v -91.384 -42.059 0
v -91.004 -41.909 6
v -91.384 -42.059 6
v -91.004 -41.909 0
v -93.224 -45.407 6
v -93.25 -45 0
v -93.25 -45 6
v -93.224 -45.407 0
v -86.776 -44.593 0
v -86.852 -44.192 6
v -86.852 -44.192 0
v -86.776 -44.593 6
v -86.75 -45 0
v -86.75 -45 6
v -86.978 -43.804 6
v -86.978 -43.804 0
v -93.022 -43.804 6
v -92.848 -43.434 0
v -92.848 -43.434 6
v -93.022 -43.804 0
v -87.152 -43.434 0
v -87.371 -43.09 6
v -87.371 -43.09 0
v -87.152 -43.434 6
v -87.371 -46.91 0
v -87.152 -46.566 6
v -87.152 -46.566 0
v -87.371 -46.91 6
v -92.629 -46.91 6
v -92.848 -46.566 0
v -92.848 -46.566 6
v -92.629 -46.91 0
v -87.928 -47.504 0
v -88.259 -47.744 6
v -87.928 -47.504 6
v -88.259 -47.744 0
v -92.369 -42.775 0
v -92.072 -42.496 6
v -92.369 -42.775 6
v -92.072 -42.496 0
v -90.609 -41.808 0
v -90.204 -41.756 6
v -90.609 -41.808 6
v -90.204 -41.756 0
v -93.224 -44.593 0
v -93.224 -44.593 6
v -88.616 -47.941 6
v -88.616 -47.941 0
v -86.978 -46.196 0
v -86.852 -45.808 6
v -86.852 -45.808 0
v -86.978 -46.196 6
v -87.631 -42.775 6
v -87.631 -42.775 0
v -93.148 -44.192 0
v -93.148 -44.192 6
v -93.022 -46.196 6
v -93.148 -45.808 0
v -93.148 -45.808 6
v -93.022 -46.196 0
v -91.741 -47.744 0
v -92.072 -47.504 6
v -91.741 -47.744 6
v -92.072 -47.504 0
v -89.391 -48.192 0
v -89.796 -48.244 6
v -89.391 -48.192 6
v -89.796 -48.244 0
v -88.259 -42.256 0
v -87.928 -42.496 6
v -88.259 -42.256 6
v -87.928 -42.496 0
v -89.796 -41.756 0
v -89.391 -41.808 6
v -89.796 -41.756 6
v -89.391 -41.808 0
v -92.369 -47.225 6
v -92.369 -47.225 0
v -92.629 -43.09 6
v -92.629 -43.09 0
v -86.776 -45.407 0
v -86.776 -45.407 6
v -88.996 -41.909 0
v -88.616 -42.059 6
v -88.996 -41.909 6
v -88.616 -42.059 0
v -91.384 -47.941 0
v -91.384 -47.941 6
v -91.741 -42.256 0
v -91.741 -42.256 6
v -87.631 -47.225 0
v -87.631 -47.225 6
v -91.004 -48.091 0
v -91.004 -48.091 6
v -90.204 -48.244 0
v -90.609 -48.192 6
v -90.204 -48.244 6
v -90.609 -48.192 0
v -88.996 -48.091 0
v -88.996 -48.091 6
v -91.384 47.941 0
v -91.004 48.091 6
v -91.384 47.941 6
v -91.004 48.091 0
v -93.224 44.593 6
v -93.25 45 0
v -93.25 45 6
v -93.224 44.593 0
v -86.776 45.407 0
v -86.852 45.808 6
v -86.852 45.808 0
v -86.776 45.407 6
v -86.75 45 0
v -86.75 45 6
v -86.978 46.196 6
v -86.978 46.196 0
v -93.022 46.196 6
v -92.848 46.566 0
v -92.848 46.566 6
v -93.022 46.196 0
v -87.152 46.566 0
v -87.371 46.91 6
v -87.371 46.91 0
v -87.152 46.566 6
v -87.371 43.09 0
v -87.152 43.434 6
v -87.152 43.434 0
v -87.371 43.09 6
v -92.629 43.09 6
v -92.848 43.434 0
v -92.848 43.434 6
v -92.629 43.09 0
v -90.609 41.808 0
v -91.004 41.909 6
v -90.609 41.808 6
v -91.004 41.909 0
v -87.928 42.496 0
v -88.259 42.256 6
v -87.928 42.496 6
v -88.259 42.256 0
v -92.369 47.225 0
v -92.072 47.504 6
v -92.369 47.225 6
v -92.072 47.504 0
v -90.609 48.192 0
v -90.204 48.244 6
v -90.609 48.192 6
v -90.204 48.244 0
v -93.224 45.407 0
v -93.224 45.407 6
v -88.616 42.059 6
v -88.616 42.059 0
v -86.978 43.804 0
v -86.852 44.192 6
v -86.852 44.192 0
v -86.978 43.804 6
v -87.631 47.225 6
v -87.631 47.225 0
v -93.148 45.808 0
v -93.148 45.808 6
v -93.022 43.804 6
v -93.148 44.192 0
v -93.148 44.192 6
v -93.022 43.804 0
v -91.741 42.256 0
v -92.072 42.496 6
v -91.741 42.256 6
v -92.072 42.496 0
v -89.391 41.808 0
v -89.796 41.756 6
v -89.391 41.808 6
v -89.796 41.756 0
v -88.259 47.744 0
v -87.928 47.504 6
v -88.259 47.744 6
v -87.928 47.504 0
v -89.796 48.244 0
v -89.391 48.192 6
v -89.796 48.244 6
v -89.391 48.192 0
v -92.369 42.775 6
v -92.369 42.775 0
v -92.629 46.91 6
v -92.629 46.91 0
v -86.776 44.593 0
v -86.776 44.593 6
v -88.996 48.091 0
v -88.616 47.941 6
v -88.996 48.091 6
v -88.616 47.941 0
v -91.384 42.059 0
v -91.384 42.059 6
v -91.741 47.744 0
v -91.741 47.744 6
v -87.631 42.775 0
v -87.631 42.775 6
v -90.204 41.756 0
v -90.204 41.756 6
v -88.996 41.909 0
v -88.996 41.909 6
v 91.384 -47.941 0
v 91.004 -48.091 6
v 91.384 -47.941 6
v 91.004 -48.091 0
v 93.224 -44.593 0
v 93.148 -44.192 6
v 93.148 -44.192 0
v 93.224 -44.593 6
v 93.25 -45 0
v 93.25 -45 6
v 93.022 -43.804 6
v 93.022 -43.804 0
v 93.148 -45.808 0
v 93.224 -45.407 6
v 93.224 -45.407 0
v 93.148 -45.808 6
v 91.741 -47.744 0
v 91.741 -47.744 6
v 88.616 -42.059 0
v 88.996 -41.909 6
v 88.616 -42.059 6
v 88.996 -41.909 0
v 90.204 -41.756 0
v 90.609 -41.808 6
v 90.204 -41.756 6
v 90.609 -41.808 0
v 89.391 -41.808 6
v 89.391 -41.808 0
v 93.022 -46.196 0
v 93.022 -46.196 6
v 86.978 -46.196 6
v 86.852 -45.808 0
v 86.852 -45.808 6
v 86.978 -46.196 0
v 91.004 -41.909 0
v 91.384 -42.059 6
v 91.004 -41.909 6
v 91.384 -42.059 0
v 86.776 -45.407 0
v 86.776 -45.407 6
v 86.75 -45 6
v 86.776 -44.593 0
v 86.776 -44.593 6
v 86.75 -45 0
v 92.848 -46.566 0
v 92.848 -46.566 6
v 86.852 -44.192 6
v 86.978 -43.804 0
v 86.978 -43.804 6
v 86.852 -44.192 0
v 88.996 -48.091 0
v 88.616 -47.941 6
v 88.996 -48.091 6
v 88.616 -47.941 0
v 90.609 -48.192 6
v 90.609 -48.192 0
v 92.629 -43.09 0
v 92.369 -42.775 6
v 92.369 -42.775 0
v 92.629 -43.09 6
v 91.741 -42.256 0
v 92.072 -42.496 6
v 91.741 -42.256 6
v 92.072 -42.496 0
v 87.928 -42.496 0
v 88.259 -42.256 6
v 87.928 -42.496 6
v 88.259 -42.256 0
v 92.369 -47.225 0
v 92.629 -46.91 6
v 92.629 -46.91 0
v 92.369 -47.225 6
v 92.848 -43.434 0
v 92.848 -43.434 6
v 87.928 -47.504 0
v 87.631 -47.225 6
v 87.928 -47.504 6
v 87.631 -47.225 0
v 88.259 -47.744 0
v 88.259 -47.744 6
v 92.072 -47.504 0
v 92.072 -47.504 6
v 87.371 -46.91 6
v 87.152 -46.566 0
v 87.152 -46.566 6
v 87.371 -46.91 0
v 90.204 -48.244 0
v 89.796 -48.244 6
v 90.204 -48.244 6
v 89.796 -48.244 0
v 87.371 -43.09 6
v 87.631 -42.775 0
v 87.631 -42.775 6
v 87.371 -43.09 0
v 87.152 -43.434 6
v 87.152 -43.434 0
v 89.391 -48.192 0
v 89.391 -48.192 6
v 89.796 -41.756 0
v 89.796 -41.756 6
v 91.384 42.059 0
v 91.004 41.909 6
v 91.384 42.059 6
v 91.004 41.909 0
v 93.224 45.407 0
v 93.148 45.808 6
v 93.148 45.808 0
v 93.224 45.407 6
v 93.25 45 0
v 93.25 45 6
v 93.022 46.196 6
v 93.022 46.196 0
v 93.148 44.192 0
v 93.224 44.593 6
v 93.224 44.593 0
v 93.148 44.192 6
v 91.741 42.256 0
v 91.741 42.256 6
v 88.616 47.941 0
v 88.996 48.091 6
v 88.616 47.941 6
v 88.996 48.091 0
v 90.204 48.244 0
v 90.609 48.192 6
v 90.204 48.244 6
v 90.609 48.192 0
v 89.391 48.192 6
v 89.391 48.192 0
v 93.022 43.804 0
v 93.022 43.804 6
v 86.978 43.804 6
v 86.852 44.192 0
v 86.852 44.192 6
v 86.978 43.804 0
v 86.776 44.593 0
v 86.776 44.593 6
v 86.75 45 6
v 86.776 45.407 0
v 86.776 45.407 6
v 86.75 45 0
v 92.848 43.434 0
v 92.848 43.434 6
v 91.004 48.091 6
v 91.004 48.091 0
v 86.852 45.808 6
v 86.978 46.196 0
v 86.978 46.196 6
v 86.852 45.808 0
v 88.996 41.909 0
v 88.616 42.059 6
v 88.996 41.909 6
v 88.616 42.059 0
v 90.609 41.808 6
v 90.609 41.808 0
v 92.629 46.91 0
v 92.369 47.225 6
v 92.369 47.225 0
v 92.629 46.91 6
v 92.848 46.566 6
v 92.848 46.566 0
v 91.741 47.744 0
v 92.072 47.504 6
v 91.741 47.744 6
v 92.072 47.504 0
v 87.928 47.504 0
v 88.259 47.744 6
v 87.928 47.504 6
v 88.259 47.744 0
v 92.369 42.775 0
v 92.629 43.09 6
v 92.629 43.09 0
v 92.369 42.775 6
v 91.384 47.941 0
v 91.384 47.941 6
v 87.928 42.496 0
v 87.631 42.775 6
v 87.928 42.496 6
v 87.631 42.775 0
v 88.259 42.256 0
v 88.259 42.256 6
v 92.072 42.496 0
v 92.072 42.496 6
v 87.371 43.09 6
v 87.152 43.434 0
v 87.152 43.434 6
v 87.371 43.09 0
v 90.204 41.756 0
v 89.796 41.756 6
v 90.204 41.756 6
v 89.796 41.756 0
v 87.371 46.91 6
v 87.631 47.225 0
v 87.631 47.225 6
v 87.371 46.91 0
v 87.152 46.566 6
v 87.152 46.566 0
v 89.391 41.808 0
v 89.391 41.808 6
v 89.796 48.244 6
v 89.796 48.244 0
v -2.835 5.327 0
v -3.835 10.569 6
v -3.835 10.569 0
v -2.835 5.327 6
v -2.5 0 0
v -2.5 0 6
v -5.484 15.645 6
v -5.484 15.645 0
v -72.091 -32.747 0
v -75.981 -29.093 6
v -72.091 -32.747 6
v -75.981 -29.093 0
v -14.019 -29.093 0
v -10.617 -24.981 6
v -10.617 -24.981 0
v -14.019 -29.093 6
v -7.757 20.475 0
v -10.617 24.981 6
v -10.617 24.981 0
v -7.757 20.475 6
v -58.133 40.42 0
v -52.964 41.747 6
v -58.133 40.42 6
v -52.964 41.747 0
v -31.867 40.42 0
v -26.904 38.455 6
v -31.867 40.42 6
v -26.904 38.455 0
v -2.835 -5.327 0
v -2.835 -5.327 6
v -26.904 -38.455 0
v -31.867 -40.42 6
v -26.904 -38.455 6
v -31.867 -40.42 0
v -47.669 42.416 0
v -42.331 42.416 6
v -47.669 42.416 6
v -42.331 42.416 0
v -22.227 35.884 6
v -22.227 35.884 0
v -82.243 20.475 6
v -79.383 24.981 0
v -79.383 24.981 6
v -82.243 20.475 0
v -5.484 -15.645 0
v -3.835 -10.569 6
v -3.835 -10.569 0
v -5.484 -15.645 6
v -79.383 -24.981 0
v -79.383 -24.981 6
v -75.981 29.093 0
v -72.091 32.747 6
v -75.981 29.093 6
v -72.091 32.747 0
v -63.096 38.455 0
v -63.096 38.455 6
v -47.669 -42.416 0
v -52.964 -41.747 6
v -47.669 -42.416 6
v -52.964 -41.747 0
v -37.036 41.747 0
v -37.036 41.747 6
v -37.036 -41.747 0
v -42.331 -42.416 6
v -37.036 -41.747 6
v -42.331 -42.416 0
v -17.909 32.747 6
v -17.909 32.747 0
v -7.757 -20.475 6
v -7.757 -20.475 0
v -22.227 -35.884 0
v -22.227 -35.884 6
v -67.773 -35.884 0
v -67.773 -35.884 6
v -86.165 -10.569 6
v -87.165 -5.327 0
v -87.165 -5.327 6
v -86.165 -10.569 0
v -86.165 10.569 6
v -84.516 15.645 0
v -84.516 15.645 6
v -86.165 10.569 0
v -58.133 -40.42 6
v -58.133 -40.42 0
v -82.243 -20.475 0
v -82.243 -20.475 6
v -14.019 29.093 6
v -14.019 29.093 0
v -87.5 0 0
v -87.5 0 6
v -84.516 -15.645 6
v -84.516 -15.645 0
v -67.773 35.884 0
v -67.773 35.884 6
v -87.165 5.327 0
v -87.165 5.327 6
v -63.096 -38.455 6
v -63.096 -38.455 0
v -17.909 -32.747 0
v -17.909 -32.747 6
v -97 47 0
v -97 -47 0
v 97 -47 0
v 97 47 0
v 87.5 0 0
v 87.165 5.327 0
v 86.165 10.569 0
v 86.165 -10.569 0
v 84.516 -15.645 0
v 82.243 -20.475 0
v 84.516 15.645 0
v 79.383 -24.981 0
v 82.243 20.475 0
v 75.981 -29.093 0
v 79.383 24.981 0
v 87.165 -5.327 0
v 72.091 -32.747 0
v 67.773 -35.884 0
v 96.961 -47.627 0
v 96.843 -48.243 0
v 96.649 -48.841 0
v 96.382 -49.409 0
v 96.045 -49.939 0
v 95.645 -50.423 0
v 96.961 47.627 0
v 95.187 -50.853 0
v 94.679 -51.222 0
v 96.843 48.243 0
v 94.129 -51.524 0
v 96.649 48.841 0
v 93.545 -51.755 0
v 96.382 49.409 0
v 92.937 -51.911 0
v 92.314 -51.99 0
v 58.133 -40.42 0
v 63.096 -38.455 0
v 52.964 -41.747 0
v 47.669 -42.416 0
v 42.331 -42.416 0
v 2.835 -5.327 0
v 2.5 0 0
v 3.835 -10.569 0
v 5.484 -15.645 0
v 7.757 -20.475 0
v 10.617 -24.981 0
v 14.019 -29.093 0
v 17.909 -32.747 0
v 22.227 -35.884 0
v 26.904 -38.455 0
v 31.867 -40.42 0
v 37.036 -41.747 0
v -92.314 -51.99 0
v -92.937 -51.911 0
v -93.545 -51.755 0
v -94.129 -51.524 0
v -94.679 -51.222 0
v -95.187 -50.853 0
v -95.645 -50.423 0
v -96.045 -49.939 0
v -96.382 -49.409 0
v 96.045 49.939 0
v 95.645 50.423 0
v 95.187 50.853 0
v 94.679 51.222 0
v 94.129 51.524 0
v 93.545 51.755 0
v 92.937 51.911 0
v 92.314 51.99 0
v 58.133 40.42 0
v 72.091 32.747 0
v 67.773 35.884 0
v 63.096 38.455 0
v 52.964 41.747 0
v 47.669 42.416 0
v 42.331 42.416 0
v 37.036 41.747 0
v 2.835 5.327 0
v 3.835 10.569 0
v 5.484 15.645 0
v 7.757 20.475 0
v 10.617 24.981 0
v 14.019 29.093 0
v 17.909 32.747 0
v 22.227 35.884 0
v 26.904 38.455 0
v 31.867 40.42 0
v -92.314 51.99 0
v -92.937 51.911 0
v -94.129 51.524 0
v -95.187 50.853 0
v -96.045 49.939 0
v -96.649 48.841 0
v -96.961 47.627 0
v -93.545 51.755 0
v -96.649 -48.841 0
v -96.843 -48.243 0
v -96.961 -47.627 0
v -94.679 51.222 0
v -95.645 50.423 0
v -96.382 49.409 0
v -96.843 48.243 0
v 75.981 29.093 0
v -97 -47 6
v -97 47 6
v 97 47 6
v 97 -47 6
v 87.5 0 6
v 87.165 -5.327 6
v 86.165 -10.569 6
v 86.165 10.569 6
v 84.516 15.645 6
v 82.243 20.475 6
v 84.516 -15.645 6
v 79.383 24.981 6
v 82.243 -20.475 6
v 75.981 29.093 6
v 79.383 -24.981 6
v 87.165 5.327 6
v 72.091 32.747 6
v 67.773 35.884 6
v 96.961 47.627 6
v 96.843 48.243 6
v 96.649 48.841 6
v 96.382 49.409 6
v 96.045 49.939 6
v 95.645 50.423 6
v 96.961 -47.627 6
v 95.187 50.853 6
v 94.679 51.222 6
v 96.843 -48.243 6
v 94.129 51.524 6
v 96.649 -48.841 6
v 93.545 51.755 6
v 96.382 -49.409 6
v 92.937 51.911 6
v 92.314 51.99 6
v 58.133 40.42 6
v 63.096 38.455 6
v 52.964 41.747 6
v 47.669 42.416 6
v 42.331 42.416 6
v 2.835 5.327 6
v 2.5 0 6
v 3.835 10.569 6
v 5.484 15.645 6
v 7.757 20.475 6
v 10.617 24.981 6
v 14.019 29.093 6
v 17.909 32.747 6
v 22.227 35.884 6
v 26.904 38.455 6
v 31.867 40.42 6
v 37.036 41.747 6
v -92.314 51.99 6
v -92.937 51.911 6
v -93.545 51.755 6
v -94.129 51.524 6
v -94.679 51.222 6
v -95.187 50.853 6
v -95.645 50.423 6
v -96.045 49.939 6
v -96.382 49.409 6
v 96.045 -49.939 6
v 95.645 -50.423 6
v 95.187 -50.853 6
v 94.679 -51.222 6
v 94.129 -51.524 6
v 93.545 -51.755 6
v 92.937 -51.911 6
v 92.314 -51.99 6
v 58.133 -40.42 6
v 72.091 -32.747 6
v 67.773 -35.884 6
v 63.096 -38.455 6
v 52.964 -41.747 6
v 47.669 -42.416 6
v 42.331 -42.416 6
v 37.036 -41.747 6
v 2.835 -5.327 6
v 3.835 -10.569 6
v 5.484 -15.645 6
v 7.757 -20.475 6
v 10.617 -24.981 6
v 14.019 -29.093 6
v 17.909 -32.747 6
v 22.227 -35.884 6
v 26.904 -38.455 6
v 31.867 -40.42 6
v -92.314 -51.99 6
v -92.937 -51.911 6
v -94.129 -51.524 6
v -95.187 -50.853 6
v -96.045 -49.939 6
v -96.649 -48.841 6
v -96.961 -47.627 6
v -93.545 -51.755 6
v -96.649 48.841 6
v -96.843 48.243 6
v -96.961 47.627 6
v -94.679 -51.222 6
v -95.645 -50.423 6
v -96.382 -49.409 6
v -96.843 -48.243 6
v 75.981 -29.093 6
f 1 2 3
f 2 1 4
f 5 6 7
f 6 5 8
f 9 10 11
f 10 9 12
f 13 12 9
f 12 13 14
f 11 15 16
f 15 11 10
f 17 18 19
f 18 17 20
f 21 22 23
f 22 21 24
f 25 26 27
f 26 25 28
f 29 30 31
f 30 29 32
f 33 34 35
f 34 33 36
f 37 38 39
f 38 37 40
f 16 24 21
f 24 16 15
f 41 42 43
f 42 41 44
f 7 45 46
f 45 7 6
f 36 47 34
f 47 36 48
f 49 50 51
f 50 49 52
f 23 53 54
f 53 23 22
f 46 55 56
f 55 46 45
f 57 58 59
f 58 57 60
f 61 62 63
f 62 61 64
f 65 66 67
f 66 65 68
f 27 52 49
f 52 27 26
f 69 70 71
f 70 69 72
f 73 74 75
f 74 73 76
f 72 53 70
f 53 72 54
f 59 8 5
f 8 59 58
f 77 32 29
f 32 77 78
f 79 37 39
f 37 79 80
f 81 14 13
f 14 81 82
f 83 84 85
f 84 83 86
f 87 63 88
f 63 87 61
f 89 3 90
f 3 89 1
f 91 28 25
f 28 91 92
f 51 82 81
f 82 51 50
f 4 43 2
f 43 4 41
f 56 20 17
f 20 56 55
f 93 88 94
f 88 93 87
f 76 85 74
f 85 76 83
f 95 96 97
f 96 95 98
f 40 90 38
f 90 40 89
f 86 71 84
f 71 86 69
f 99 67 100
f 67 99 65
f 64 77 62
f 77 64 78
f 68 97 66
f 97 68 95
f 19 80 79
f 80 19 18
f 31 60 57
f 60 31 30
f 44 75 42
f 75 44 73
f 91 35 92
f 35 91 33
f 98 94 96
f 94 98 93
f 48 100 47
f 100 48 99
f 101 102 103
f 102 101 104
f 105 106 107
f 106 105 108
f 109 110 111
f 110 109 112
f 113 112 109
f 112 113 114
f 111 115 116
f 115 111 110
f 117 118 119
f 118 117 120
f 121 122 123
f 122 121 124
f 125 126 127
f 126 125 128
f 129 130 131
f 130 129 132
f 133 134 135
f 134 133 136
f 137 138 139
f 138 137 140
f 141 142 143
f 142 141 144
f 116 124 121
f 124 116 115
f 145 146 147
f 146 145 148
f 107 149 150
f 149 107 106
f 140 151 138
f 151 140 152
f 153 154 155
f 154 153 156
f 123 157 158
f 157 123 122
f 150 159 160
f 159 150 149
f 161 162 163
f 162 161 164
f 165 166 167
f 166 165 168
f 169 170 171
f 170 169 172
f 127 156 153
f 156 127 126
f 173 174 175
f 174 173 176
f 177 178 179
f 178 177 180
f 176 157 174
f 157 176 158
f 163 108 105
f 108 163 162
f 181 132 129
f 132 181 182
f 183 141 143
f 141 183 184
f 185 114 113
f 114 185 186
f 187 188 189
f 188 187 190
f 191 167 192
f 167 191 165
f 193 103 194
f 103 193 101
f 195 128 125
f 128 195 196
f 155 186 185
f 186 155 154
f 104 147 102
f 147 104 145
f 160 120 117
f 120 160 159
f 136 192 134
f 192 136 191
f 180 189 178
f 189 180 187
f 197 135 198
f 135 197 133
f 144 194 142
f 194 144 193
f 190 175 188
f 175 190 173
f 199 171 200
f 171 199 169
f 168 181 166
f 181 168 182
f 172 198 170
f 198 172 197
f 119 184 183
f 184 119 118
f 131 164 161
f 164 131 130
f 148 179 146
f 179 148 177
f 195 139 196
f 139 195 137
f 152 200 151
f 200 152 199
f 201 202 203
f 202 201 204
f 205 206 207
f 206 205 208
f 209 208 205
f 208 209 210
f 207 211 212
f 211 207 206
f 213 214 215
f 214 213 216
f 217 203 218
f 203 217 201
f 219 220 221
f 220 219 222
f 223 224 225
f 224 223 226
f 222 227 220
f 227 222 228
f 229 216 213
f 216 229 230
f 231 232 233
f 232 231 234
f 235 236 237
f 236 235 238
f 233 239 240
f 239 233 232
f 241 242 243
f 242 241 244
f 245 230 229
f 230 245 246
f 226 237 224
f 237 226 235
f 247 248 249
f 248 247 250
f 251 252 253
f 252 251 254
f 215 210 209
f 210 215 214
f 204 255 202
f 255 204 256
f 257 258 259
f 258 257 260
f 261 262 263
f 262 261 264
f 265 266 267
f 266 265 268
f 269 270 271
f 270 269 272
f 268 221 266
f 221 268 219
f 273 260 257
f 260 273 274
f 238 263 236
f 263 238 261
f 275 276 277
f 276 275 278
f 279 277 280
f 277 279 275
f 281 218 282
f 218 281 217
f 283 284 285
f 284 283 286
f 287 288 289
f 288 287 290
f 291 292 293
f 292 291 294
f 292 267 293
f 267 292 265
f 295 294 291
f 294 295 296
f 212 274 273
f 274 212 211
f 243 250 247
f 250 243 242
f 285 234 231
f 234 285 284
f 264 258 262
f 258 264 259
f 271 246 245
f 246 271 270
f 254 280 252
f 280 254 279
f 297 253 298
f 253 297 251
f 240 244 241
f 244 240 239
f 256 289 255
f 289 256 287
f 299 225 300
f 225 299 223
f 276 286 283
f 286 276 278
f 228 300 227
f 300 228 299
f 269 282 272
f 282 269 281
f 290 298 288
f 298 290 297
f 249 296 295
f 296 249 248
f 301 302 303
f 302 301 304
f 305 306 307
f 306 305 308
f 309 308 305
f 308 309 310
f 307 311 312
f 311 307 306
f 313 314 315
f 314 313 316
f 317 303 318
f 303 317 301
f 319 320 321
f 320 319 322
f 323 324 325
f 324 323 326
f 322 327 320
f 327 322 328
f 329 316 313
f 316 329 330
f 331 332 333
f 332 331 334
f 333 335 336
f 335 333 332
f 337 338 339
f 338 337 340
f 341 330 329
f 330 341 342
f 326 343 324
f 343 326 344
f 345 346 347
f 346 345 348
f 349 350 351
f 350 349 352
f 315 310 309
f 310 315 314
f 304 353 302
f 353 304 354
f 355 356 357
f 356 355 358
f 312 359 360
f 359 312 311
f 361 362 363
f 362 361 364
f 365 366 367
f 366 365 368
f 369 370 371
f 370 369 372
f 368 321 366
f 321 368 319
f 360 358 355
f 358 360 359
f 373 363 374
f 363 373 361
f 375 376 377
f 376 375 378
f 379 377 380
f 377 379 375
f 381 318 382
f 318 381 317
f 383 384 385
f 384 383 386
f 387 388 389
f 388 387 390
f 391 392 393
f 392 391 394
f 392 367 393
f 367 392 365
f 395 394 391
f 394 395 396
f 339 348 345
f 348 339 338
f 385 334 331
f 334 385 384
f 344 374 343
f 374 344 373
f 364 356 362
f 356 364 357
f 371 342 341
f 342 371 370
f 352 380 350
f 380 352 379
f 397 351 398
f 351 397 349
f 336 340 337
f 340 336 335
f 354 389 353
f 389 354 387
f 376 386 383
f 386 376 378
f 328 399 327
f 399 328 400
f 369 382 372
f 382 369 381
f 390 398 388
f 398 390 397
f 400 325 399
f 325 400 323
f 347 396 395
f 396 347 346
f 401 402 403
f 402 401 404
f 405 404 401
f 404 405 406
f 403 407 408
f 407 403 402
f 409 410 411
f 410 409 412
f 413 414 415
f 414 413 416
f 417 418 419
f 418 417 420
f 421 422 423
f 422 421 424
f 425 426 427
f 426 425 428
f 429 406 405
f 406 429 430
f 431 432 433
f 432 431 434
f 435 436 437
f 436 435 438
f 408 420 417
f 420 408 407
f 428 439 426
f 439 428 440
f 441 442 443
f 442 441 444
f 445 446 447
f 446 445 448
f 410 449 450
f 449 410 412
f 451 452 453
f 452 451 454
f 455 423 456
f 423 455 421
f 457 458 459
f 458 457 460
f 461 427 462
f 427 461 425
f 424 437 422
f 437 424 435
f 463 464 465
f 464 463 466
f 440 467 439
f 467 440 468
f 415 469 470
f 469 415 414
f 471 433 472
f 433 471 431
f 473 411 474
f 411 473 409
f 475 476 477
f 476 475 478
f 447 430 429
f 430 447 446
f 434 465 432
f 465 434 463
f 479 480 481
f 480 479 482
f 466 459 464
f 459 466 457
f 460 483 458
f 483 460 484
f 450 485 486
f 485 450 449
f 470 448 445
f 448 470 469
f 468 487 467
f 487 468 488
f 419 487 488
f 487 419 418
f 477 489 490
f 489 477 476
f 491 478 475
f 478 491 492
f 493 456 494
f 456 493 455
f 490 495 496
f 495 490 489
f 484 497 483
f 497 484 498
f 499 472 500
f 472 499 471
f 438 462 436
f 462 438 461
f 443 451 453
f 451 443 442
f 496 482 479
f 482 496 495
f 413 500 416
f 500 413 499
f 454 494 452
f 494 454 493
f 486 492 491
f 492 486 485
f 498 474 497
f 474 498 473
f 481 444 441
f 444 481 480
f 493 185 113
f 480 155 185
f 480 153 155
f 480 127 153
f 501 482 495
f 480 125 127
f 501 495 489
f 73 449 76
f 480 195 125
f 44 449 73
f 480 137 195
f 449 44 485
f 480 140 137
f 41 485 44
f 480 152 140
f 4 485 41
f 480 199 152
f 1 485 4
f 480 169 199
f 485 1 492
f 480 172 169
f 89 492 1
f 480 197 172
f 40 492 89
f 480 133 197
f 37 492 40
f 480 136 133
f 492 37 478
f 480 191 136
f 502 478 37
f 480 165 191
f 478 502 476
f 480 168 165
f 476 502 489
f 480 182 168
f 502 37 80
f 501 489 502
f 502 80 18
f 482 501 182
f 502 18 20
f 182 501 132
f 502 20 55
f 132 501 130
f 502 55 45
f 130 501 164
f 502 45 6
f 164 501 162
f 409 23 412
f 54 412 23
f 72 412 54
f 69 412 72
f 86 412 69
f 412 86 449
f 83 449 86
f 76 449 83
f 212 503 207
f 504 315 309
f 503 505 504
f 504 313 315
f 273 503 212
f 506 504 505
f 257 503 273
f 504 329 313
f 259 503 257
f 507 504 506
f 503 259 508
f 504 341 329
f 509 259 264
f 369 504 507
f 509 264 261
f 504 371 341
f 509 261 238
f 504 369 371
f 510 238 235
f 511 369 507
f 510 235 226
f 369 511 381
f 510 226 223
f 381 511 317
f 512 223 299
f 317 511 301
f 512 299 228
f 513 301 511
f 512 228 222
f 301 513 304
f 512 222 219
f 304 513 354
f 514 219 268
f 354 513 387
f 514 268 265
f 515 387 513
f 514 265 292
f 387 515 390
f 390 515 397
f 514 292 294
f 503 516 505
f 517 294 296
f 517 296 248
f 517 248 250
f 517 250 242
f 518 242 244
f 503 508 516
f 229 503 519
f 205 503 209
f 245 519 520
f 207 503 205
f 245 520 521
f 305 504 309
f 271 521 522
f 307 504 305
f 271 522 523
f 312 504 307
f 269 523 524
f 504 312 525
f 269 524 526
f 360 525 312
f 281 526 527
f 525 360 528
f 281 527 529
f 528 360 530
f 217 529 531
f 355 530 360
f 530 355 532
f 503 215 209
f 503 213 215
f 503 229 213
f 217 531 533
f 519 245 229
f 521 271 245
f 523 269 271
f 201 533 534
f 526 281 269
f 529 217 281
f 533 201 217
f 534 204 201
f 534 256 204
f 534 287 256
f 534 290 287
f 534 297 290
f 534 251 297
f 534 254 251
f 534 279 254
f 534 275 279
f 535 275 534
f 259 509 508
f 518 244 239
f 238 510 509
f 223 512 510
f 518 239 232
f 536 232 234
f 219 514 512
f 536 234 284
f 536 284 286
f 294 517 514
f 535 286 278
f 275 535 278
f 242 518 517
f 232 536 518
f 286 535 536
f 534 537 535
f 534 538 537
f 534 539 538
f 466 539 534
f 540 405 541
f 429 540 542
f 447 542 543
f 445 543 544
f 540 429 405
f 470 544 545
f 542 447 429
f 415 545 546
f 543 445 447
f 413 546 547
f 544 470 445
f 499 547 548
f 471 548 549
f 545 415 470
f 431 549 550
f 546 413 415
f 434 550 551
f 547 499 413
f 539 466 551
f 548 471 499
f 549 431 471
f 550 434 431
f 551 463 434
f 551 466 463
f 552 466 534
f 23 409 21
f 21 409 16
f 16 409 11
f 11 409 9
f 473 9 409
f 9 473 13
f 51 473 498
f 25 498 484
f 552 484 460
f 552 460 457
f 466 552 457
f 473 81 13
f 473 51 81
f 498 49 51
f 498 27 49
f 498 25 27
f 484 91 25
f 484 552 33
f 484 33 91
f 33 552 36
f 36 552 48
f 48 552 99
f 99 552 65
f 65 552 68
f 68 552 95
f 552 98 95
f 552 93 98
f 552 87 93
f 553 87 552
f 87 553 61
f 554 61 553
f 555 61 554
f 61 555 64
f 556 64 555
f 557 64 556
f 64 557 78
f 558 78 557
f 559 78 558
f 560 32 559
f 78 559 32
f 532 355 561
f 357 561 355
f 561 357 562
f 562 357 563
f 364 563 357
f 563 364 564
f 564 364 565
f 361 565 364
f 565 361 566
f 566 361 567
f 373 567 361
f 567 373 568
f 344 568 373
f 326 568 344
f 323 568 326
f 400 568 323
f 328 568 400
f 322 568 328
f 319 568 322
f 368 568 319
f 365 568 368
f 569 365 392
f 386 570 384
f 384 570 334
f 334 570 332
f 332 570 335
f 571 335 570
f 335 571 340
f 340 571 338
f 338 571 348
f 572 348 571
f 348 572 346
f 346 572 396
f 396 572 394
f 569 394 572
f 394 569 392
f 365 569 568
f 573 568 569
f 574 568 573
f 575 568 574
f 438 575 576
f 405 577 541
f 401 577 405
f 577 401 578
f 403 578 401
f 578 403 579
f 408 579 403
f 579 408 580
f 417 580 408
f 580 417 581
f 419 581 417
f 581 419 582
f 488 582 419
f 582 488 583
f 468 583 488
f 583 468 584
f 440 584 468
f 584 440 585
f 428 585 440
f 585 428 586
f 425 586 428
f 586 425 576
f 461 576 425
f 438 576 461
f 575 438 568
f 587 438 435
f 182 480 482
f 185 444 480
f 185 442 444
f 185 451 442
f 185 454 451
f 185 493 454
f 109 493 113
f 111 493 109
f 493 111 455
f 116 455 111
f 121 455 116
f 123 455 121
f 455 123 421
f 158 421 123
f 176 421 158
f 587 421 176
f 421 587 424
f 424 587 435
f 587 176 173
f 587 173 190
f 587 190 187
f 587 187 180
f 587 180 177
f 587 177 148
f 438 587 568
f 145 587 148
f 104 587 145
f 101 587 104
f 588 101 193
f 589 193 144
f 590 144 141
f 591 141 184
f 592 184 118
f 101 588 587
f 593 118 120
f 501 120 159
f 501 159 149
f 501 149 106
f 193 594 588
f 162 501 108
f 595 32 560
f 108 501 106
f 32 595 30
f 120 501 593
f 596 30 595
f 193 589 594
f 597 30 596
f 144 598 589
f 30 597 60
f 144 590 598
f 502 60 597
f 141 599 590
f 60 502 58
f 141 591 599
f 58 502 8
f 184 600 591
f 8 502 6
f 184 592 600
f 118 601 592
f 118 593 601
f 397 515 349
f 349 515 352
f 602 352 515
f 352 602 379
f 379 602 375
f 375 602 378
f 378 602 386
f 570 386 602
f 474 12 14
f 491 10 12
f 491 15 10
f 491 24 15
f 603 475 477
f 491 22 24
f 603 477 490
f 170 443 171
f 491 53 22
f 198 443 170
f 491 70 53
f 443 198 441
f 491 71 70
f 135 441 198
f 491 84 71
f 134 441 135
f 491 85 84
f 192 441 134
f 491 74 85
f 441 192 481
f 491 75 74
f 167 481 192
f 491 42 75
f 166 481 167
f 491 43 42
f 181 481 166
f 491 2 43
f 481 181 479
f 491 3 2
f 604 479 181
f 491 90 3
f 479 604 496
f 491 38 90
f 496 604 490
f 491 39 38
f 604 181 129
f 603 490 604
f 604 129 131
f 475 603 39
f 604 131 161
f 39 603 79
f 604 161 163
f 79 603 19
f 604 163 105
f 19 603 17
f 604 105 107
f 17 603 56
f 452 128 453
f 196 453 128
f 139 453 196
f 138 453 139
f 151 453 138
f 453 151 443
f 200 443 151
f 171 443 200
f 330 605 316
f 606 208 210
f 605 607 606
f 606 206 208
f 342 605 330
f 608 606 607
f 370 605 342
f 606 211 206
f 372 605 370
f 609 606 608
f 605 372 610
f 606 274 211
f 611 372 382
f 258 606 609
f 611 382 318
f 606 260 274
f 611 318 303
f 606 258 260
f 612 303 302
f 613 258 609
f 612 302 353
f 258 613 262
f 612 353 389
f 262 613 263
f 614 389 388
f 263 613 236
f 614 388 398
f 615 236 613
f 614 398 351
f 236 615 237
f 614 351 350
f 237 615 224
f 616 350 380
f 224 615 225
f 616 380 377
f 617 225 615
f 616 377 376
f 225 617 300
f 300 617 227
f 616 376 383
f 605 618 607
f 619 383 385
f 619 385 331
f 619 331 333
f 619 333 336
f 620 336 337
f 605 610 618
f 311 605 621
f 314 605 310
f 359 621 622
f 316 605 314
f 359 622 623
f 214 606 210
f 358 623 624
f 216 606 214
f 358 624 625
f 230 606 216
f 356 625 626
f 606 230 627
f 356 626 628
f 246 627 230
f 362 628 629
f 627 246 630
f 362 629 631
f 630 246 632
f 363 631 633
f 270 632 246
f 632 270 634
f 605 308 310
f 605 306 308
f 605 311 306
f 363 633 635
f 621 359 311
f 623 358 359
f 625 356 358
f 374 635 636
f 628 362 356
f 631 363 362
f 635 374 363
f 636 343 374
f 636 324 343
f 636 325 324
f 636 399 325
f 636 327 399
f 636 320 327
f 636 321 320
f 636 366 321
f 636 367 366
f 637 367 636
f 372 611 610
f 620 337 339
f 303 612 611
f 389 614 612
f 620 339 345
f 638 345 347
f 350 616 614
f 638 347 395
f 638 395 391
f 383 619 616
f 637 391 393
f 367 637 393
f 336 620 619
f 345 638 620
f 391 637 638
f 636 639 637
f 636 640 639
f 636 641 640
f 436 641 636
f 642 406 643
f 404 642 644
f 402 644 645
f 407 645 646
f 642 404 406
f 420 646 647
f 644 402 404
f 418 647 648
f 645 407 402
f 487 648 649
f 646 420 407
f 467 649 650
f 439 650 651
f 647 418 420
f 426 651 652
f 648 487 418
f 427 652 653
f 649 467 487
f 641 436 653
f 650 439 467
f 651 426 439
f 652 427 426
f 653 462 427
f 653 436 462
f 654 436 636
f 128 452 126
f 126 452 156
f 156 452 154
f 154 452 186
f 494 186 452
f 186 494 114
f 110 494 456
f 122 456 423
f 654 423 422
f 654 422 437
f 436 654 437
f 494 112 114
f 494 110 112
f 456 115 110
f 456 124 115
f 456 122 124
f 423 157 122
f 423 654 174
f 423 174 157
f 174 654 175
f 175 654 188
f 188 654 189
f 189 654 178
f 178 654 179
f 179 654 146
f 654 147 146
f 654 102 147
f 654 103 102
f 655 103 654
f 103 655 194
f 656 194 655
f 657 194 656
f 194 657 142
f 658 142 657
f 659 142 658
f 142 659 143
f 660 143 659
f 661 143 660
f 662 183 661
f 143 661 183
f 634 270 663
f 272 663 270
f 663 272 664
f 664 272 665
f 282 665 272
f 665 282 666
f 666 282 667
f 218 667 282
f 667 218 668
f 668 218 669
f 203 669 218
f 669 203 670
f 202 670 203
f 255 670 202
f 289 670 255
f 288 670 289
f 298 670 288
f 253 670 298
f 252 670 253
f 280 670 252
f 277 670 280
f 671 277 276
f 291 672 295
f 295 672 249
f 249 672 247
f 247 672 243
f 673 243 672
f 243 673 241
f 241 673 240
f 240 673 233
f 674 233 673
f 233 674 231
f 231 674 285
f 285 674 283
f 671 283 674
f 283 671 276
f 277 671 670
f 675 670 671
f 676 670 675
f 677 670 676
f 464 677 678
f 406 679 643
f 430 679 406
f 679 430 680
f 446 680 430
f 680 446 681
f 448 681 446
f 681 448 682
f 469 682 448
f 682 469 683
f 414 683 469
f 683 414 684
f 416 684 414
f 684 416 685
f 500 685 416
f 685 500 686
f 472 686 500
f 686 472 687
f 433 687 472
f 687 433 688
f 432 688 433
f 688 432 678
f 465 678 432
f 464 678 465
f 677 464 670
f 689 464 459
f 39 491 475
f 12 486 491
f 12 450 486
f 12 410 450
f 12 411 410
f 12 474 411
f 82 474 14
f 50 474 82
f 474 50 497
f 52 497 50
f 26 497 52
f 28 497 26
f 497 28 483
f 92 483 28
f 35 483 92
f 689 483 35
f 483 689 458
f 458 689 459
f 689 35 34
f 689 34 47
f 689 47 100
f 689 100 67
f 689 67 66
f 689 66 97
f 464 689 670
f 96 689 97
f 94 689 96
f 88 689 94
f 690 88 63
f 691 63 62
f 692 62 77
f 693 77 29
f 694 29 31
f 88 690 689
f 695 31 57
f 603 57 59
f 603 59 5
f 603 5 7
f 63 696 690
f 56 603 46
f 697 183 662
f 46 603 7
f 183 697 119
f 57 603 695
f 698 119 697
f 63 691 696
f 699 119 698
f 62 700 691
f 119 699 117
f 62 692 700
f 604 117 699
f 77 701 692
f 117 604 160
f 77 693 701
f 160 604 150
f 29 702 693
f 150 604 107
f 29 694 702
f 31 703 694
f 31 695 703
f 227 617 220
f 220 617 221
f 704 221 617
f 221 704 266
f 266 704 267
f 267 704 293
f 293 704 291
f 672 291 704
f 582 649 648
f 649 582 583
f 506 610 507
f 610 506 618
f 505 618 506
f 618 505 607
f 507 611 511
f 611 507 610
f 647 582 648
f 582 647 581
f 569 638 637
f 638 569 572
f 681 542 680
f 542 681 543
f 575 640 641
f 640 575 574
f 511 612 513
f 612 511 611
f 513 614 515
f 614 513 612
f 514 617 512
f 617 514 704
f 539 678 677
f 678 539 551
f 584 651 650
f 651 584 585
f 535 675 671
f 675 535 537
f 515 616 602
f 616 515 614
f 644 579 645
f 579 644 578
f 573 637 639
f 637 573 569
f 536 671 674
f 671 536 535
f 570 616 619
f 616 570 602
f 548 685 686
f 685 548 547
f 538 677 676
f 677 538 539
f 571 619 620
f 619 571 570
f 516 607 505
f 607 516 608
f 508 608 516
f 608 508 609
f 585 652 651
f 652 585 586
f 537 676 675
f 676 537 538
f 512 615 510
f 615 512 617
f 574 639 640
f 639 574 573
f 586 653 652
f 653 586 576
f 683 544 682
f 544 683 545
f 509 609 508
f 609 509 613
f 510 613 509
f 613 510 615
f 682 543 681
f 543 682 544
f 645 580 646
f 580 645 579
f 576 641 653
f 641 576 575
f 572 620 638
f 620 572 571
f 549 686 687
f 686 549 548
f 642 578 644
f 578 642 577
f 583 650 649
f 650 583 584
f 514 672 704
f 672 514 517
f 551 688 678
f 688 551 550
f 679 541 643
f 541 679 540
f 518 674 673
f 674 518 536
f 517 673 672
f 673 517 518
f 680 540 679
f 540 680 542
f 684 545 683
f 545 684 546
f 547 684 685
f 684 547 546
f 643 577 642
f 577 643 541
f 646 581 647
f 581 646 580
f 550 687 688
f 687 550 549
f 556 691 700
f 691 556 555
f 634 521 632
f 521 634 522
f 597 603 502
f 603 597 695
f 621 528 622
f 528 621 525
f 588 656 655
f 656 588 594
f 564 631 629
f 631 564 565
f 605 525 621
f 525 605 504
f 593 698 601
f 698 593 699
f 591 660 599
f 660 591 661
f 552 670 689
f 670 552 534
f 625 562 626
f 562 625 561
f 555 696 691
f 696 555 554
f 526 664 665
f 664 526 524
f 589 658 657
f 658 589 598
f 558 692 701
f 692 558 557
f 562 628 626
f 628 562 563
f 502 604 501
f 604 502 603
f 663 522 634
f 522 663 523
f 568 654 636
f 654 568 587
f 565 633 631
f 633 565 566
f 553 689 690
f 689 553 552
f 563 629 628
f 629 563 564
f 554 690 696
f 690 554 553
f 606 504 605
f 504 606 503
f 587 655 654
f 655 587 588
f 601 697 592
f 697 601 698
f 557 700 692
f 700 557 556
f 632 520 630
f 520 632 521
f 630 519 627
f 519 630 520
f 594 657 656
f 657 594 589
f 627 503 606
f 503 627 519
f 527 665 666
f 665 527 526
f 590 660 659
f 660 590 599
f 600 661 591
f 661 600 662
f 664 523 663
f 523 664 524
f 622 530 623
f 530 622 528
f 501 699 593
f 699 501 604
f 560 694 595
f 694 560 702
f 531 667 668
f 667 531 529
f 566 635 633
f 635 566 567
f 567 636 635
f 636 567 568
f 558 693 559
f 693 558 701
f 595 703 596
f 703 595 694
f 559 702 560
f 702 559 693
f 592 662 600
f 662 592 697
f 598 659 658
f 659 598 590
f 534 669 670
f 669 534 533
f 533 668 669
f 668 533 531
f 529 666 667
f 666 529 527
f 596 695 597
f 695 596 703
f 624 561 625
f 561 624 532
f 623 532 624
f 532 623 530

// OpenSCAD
$fn = 50;


difference() {
	union() {
		hull() {
			translate(v = [-92.0000000000, 47.0000000000, 0]) {
				cylinder(h = 6, r = 5);
			}
			translate(v = [92.0000000000, 47.0000000000, 0]) {
				cylinder(h = 6, r = 5);
			}
			translate(v = [-92.0000000000, -47.0000000000, 0]) {
				cylinder(h = 6, r = 5);
			}
			translate(v = [92.0000000000, -47.0000000000, 0]) {
				cylinder(h = 6, r = 5);
			}
		}
	}
	union() {
		#translate(v = [-90.0000000000, -45.0000000000, -100.0000000000]) {
			cylinder(h = 200, r = 3.2500000000);
		}
		#translate(v = [-90.0000000000, 45.0000000000, -100.0000000000]) {
			cylinder(h = 200, r = 3.2500000000);
		}
		#translate(v = [90.0000000000, -45.0000000000, -100.0000000000]) {
			cylinder(h = 200, r = 3.2500000000);
		}
		#translate(v = [90.0000000000, 45.0000000000, -100.0000000000]) {
			cylinder(h = 200, r = 3.2500000000);
		}
		#translate(v = [-45.0000000000, 0, 0]) {
			cylinder(h = 6, r = 42.5000000000);
		}
		#translate(v = [45.0000000000, 0, 0]) {
			cylinder(h = 6, r = 42.5000000000);
		}
	}
}
